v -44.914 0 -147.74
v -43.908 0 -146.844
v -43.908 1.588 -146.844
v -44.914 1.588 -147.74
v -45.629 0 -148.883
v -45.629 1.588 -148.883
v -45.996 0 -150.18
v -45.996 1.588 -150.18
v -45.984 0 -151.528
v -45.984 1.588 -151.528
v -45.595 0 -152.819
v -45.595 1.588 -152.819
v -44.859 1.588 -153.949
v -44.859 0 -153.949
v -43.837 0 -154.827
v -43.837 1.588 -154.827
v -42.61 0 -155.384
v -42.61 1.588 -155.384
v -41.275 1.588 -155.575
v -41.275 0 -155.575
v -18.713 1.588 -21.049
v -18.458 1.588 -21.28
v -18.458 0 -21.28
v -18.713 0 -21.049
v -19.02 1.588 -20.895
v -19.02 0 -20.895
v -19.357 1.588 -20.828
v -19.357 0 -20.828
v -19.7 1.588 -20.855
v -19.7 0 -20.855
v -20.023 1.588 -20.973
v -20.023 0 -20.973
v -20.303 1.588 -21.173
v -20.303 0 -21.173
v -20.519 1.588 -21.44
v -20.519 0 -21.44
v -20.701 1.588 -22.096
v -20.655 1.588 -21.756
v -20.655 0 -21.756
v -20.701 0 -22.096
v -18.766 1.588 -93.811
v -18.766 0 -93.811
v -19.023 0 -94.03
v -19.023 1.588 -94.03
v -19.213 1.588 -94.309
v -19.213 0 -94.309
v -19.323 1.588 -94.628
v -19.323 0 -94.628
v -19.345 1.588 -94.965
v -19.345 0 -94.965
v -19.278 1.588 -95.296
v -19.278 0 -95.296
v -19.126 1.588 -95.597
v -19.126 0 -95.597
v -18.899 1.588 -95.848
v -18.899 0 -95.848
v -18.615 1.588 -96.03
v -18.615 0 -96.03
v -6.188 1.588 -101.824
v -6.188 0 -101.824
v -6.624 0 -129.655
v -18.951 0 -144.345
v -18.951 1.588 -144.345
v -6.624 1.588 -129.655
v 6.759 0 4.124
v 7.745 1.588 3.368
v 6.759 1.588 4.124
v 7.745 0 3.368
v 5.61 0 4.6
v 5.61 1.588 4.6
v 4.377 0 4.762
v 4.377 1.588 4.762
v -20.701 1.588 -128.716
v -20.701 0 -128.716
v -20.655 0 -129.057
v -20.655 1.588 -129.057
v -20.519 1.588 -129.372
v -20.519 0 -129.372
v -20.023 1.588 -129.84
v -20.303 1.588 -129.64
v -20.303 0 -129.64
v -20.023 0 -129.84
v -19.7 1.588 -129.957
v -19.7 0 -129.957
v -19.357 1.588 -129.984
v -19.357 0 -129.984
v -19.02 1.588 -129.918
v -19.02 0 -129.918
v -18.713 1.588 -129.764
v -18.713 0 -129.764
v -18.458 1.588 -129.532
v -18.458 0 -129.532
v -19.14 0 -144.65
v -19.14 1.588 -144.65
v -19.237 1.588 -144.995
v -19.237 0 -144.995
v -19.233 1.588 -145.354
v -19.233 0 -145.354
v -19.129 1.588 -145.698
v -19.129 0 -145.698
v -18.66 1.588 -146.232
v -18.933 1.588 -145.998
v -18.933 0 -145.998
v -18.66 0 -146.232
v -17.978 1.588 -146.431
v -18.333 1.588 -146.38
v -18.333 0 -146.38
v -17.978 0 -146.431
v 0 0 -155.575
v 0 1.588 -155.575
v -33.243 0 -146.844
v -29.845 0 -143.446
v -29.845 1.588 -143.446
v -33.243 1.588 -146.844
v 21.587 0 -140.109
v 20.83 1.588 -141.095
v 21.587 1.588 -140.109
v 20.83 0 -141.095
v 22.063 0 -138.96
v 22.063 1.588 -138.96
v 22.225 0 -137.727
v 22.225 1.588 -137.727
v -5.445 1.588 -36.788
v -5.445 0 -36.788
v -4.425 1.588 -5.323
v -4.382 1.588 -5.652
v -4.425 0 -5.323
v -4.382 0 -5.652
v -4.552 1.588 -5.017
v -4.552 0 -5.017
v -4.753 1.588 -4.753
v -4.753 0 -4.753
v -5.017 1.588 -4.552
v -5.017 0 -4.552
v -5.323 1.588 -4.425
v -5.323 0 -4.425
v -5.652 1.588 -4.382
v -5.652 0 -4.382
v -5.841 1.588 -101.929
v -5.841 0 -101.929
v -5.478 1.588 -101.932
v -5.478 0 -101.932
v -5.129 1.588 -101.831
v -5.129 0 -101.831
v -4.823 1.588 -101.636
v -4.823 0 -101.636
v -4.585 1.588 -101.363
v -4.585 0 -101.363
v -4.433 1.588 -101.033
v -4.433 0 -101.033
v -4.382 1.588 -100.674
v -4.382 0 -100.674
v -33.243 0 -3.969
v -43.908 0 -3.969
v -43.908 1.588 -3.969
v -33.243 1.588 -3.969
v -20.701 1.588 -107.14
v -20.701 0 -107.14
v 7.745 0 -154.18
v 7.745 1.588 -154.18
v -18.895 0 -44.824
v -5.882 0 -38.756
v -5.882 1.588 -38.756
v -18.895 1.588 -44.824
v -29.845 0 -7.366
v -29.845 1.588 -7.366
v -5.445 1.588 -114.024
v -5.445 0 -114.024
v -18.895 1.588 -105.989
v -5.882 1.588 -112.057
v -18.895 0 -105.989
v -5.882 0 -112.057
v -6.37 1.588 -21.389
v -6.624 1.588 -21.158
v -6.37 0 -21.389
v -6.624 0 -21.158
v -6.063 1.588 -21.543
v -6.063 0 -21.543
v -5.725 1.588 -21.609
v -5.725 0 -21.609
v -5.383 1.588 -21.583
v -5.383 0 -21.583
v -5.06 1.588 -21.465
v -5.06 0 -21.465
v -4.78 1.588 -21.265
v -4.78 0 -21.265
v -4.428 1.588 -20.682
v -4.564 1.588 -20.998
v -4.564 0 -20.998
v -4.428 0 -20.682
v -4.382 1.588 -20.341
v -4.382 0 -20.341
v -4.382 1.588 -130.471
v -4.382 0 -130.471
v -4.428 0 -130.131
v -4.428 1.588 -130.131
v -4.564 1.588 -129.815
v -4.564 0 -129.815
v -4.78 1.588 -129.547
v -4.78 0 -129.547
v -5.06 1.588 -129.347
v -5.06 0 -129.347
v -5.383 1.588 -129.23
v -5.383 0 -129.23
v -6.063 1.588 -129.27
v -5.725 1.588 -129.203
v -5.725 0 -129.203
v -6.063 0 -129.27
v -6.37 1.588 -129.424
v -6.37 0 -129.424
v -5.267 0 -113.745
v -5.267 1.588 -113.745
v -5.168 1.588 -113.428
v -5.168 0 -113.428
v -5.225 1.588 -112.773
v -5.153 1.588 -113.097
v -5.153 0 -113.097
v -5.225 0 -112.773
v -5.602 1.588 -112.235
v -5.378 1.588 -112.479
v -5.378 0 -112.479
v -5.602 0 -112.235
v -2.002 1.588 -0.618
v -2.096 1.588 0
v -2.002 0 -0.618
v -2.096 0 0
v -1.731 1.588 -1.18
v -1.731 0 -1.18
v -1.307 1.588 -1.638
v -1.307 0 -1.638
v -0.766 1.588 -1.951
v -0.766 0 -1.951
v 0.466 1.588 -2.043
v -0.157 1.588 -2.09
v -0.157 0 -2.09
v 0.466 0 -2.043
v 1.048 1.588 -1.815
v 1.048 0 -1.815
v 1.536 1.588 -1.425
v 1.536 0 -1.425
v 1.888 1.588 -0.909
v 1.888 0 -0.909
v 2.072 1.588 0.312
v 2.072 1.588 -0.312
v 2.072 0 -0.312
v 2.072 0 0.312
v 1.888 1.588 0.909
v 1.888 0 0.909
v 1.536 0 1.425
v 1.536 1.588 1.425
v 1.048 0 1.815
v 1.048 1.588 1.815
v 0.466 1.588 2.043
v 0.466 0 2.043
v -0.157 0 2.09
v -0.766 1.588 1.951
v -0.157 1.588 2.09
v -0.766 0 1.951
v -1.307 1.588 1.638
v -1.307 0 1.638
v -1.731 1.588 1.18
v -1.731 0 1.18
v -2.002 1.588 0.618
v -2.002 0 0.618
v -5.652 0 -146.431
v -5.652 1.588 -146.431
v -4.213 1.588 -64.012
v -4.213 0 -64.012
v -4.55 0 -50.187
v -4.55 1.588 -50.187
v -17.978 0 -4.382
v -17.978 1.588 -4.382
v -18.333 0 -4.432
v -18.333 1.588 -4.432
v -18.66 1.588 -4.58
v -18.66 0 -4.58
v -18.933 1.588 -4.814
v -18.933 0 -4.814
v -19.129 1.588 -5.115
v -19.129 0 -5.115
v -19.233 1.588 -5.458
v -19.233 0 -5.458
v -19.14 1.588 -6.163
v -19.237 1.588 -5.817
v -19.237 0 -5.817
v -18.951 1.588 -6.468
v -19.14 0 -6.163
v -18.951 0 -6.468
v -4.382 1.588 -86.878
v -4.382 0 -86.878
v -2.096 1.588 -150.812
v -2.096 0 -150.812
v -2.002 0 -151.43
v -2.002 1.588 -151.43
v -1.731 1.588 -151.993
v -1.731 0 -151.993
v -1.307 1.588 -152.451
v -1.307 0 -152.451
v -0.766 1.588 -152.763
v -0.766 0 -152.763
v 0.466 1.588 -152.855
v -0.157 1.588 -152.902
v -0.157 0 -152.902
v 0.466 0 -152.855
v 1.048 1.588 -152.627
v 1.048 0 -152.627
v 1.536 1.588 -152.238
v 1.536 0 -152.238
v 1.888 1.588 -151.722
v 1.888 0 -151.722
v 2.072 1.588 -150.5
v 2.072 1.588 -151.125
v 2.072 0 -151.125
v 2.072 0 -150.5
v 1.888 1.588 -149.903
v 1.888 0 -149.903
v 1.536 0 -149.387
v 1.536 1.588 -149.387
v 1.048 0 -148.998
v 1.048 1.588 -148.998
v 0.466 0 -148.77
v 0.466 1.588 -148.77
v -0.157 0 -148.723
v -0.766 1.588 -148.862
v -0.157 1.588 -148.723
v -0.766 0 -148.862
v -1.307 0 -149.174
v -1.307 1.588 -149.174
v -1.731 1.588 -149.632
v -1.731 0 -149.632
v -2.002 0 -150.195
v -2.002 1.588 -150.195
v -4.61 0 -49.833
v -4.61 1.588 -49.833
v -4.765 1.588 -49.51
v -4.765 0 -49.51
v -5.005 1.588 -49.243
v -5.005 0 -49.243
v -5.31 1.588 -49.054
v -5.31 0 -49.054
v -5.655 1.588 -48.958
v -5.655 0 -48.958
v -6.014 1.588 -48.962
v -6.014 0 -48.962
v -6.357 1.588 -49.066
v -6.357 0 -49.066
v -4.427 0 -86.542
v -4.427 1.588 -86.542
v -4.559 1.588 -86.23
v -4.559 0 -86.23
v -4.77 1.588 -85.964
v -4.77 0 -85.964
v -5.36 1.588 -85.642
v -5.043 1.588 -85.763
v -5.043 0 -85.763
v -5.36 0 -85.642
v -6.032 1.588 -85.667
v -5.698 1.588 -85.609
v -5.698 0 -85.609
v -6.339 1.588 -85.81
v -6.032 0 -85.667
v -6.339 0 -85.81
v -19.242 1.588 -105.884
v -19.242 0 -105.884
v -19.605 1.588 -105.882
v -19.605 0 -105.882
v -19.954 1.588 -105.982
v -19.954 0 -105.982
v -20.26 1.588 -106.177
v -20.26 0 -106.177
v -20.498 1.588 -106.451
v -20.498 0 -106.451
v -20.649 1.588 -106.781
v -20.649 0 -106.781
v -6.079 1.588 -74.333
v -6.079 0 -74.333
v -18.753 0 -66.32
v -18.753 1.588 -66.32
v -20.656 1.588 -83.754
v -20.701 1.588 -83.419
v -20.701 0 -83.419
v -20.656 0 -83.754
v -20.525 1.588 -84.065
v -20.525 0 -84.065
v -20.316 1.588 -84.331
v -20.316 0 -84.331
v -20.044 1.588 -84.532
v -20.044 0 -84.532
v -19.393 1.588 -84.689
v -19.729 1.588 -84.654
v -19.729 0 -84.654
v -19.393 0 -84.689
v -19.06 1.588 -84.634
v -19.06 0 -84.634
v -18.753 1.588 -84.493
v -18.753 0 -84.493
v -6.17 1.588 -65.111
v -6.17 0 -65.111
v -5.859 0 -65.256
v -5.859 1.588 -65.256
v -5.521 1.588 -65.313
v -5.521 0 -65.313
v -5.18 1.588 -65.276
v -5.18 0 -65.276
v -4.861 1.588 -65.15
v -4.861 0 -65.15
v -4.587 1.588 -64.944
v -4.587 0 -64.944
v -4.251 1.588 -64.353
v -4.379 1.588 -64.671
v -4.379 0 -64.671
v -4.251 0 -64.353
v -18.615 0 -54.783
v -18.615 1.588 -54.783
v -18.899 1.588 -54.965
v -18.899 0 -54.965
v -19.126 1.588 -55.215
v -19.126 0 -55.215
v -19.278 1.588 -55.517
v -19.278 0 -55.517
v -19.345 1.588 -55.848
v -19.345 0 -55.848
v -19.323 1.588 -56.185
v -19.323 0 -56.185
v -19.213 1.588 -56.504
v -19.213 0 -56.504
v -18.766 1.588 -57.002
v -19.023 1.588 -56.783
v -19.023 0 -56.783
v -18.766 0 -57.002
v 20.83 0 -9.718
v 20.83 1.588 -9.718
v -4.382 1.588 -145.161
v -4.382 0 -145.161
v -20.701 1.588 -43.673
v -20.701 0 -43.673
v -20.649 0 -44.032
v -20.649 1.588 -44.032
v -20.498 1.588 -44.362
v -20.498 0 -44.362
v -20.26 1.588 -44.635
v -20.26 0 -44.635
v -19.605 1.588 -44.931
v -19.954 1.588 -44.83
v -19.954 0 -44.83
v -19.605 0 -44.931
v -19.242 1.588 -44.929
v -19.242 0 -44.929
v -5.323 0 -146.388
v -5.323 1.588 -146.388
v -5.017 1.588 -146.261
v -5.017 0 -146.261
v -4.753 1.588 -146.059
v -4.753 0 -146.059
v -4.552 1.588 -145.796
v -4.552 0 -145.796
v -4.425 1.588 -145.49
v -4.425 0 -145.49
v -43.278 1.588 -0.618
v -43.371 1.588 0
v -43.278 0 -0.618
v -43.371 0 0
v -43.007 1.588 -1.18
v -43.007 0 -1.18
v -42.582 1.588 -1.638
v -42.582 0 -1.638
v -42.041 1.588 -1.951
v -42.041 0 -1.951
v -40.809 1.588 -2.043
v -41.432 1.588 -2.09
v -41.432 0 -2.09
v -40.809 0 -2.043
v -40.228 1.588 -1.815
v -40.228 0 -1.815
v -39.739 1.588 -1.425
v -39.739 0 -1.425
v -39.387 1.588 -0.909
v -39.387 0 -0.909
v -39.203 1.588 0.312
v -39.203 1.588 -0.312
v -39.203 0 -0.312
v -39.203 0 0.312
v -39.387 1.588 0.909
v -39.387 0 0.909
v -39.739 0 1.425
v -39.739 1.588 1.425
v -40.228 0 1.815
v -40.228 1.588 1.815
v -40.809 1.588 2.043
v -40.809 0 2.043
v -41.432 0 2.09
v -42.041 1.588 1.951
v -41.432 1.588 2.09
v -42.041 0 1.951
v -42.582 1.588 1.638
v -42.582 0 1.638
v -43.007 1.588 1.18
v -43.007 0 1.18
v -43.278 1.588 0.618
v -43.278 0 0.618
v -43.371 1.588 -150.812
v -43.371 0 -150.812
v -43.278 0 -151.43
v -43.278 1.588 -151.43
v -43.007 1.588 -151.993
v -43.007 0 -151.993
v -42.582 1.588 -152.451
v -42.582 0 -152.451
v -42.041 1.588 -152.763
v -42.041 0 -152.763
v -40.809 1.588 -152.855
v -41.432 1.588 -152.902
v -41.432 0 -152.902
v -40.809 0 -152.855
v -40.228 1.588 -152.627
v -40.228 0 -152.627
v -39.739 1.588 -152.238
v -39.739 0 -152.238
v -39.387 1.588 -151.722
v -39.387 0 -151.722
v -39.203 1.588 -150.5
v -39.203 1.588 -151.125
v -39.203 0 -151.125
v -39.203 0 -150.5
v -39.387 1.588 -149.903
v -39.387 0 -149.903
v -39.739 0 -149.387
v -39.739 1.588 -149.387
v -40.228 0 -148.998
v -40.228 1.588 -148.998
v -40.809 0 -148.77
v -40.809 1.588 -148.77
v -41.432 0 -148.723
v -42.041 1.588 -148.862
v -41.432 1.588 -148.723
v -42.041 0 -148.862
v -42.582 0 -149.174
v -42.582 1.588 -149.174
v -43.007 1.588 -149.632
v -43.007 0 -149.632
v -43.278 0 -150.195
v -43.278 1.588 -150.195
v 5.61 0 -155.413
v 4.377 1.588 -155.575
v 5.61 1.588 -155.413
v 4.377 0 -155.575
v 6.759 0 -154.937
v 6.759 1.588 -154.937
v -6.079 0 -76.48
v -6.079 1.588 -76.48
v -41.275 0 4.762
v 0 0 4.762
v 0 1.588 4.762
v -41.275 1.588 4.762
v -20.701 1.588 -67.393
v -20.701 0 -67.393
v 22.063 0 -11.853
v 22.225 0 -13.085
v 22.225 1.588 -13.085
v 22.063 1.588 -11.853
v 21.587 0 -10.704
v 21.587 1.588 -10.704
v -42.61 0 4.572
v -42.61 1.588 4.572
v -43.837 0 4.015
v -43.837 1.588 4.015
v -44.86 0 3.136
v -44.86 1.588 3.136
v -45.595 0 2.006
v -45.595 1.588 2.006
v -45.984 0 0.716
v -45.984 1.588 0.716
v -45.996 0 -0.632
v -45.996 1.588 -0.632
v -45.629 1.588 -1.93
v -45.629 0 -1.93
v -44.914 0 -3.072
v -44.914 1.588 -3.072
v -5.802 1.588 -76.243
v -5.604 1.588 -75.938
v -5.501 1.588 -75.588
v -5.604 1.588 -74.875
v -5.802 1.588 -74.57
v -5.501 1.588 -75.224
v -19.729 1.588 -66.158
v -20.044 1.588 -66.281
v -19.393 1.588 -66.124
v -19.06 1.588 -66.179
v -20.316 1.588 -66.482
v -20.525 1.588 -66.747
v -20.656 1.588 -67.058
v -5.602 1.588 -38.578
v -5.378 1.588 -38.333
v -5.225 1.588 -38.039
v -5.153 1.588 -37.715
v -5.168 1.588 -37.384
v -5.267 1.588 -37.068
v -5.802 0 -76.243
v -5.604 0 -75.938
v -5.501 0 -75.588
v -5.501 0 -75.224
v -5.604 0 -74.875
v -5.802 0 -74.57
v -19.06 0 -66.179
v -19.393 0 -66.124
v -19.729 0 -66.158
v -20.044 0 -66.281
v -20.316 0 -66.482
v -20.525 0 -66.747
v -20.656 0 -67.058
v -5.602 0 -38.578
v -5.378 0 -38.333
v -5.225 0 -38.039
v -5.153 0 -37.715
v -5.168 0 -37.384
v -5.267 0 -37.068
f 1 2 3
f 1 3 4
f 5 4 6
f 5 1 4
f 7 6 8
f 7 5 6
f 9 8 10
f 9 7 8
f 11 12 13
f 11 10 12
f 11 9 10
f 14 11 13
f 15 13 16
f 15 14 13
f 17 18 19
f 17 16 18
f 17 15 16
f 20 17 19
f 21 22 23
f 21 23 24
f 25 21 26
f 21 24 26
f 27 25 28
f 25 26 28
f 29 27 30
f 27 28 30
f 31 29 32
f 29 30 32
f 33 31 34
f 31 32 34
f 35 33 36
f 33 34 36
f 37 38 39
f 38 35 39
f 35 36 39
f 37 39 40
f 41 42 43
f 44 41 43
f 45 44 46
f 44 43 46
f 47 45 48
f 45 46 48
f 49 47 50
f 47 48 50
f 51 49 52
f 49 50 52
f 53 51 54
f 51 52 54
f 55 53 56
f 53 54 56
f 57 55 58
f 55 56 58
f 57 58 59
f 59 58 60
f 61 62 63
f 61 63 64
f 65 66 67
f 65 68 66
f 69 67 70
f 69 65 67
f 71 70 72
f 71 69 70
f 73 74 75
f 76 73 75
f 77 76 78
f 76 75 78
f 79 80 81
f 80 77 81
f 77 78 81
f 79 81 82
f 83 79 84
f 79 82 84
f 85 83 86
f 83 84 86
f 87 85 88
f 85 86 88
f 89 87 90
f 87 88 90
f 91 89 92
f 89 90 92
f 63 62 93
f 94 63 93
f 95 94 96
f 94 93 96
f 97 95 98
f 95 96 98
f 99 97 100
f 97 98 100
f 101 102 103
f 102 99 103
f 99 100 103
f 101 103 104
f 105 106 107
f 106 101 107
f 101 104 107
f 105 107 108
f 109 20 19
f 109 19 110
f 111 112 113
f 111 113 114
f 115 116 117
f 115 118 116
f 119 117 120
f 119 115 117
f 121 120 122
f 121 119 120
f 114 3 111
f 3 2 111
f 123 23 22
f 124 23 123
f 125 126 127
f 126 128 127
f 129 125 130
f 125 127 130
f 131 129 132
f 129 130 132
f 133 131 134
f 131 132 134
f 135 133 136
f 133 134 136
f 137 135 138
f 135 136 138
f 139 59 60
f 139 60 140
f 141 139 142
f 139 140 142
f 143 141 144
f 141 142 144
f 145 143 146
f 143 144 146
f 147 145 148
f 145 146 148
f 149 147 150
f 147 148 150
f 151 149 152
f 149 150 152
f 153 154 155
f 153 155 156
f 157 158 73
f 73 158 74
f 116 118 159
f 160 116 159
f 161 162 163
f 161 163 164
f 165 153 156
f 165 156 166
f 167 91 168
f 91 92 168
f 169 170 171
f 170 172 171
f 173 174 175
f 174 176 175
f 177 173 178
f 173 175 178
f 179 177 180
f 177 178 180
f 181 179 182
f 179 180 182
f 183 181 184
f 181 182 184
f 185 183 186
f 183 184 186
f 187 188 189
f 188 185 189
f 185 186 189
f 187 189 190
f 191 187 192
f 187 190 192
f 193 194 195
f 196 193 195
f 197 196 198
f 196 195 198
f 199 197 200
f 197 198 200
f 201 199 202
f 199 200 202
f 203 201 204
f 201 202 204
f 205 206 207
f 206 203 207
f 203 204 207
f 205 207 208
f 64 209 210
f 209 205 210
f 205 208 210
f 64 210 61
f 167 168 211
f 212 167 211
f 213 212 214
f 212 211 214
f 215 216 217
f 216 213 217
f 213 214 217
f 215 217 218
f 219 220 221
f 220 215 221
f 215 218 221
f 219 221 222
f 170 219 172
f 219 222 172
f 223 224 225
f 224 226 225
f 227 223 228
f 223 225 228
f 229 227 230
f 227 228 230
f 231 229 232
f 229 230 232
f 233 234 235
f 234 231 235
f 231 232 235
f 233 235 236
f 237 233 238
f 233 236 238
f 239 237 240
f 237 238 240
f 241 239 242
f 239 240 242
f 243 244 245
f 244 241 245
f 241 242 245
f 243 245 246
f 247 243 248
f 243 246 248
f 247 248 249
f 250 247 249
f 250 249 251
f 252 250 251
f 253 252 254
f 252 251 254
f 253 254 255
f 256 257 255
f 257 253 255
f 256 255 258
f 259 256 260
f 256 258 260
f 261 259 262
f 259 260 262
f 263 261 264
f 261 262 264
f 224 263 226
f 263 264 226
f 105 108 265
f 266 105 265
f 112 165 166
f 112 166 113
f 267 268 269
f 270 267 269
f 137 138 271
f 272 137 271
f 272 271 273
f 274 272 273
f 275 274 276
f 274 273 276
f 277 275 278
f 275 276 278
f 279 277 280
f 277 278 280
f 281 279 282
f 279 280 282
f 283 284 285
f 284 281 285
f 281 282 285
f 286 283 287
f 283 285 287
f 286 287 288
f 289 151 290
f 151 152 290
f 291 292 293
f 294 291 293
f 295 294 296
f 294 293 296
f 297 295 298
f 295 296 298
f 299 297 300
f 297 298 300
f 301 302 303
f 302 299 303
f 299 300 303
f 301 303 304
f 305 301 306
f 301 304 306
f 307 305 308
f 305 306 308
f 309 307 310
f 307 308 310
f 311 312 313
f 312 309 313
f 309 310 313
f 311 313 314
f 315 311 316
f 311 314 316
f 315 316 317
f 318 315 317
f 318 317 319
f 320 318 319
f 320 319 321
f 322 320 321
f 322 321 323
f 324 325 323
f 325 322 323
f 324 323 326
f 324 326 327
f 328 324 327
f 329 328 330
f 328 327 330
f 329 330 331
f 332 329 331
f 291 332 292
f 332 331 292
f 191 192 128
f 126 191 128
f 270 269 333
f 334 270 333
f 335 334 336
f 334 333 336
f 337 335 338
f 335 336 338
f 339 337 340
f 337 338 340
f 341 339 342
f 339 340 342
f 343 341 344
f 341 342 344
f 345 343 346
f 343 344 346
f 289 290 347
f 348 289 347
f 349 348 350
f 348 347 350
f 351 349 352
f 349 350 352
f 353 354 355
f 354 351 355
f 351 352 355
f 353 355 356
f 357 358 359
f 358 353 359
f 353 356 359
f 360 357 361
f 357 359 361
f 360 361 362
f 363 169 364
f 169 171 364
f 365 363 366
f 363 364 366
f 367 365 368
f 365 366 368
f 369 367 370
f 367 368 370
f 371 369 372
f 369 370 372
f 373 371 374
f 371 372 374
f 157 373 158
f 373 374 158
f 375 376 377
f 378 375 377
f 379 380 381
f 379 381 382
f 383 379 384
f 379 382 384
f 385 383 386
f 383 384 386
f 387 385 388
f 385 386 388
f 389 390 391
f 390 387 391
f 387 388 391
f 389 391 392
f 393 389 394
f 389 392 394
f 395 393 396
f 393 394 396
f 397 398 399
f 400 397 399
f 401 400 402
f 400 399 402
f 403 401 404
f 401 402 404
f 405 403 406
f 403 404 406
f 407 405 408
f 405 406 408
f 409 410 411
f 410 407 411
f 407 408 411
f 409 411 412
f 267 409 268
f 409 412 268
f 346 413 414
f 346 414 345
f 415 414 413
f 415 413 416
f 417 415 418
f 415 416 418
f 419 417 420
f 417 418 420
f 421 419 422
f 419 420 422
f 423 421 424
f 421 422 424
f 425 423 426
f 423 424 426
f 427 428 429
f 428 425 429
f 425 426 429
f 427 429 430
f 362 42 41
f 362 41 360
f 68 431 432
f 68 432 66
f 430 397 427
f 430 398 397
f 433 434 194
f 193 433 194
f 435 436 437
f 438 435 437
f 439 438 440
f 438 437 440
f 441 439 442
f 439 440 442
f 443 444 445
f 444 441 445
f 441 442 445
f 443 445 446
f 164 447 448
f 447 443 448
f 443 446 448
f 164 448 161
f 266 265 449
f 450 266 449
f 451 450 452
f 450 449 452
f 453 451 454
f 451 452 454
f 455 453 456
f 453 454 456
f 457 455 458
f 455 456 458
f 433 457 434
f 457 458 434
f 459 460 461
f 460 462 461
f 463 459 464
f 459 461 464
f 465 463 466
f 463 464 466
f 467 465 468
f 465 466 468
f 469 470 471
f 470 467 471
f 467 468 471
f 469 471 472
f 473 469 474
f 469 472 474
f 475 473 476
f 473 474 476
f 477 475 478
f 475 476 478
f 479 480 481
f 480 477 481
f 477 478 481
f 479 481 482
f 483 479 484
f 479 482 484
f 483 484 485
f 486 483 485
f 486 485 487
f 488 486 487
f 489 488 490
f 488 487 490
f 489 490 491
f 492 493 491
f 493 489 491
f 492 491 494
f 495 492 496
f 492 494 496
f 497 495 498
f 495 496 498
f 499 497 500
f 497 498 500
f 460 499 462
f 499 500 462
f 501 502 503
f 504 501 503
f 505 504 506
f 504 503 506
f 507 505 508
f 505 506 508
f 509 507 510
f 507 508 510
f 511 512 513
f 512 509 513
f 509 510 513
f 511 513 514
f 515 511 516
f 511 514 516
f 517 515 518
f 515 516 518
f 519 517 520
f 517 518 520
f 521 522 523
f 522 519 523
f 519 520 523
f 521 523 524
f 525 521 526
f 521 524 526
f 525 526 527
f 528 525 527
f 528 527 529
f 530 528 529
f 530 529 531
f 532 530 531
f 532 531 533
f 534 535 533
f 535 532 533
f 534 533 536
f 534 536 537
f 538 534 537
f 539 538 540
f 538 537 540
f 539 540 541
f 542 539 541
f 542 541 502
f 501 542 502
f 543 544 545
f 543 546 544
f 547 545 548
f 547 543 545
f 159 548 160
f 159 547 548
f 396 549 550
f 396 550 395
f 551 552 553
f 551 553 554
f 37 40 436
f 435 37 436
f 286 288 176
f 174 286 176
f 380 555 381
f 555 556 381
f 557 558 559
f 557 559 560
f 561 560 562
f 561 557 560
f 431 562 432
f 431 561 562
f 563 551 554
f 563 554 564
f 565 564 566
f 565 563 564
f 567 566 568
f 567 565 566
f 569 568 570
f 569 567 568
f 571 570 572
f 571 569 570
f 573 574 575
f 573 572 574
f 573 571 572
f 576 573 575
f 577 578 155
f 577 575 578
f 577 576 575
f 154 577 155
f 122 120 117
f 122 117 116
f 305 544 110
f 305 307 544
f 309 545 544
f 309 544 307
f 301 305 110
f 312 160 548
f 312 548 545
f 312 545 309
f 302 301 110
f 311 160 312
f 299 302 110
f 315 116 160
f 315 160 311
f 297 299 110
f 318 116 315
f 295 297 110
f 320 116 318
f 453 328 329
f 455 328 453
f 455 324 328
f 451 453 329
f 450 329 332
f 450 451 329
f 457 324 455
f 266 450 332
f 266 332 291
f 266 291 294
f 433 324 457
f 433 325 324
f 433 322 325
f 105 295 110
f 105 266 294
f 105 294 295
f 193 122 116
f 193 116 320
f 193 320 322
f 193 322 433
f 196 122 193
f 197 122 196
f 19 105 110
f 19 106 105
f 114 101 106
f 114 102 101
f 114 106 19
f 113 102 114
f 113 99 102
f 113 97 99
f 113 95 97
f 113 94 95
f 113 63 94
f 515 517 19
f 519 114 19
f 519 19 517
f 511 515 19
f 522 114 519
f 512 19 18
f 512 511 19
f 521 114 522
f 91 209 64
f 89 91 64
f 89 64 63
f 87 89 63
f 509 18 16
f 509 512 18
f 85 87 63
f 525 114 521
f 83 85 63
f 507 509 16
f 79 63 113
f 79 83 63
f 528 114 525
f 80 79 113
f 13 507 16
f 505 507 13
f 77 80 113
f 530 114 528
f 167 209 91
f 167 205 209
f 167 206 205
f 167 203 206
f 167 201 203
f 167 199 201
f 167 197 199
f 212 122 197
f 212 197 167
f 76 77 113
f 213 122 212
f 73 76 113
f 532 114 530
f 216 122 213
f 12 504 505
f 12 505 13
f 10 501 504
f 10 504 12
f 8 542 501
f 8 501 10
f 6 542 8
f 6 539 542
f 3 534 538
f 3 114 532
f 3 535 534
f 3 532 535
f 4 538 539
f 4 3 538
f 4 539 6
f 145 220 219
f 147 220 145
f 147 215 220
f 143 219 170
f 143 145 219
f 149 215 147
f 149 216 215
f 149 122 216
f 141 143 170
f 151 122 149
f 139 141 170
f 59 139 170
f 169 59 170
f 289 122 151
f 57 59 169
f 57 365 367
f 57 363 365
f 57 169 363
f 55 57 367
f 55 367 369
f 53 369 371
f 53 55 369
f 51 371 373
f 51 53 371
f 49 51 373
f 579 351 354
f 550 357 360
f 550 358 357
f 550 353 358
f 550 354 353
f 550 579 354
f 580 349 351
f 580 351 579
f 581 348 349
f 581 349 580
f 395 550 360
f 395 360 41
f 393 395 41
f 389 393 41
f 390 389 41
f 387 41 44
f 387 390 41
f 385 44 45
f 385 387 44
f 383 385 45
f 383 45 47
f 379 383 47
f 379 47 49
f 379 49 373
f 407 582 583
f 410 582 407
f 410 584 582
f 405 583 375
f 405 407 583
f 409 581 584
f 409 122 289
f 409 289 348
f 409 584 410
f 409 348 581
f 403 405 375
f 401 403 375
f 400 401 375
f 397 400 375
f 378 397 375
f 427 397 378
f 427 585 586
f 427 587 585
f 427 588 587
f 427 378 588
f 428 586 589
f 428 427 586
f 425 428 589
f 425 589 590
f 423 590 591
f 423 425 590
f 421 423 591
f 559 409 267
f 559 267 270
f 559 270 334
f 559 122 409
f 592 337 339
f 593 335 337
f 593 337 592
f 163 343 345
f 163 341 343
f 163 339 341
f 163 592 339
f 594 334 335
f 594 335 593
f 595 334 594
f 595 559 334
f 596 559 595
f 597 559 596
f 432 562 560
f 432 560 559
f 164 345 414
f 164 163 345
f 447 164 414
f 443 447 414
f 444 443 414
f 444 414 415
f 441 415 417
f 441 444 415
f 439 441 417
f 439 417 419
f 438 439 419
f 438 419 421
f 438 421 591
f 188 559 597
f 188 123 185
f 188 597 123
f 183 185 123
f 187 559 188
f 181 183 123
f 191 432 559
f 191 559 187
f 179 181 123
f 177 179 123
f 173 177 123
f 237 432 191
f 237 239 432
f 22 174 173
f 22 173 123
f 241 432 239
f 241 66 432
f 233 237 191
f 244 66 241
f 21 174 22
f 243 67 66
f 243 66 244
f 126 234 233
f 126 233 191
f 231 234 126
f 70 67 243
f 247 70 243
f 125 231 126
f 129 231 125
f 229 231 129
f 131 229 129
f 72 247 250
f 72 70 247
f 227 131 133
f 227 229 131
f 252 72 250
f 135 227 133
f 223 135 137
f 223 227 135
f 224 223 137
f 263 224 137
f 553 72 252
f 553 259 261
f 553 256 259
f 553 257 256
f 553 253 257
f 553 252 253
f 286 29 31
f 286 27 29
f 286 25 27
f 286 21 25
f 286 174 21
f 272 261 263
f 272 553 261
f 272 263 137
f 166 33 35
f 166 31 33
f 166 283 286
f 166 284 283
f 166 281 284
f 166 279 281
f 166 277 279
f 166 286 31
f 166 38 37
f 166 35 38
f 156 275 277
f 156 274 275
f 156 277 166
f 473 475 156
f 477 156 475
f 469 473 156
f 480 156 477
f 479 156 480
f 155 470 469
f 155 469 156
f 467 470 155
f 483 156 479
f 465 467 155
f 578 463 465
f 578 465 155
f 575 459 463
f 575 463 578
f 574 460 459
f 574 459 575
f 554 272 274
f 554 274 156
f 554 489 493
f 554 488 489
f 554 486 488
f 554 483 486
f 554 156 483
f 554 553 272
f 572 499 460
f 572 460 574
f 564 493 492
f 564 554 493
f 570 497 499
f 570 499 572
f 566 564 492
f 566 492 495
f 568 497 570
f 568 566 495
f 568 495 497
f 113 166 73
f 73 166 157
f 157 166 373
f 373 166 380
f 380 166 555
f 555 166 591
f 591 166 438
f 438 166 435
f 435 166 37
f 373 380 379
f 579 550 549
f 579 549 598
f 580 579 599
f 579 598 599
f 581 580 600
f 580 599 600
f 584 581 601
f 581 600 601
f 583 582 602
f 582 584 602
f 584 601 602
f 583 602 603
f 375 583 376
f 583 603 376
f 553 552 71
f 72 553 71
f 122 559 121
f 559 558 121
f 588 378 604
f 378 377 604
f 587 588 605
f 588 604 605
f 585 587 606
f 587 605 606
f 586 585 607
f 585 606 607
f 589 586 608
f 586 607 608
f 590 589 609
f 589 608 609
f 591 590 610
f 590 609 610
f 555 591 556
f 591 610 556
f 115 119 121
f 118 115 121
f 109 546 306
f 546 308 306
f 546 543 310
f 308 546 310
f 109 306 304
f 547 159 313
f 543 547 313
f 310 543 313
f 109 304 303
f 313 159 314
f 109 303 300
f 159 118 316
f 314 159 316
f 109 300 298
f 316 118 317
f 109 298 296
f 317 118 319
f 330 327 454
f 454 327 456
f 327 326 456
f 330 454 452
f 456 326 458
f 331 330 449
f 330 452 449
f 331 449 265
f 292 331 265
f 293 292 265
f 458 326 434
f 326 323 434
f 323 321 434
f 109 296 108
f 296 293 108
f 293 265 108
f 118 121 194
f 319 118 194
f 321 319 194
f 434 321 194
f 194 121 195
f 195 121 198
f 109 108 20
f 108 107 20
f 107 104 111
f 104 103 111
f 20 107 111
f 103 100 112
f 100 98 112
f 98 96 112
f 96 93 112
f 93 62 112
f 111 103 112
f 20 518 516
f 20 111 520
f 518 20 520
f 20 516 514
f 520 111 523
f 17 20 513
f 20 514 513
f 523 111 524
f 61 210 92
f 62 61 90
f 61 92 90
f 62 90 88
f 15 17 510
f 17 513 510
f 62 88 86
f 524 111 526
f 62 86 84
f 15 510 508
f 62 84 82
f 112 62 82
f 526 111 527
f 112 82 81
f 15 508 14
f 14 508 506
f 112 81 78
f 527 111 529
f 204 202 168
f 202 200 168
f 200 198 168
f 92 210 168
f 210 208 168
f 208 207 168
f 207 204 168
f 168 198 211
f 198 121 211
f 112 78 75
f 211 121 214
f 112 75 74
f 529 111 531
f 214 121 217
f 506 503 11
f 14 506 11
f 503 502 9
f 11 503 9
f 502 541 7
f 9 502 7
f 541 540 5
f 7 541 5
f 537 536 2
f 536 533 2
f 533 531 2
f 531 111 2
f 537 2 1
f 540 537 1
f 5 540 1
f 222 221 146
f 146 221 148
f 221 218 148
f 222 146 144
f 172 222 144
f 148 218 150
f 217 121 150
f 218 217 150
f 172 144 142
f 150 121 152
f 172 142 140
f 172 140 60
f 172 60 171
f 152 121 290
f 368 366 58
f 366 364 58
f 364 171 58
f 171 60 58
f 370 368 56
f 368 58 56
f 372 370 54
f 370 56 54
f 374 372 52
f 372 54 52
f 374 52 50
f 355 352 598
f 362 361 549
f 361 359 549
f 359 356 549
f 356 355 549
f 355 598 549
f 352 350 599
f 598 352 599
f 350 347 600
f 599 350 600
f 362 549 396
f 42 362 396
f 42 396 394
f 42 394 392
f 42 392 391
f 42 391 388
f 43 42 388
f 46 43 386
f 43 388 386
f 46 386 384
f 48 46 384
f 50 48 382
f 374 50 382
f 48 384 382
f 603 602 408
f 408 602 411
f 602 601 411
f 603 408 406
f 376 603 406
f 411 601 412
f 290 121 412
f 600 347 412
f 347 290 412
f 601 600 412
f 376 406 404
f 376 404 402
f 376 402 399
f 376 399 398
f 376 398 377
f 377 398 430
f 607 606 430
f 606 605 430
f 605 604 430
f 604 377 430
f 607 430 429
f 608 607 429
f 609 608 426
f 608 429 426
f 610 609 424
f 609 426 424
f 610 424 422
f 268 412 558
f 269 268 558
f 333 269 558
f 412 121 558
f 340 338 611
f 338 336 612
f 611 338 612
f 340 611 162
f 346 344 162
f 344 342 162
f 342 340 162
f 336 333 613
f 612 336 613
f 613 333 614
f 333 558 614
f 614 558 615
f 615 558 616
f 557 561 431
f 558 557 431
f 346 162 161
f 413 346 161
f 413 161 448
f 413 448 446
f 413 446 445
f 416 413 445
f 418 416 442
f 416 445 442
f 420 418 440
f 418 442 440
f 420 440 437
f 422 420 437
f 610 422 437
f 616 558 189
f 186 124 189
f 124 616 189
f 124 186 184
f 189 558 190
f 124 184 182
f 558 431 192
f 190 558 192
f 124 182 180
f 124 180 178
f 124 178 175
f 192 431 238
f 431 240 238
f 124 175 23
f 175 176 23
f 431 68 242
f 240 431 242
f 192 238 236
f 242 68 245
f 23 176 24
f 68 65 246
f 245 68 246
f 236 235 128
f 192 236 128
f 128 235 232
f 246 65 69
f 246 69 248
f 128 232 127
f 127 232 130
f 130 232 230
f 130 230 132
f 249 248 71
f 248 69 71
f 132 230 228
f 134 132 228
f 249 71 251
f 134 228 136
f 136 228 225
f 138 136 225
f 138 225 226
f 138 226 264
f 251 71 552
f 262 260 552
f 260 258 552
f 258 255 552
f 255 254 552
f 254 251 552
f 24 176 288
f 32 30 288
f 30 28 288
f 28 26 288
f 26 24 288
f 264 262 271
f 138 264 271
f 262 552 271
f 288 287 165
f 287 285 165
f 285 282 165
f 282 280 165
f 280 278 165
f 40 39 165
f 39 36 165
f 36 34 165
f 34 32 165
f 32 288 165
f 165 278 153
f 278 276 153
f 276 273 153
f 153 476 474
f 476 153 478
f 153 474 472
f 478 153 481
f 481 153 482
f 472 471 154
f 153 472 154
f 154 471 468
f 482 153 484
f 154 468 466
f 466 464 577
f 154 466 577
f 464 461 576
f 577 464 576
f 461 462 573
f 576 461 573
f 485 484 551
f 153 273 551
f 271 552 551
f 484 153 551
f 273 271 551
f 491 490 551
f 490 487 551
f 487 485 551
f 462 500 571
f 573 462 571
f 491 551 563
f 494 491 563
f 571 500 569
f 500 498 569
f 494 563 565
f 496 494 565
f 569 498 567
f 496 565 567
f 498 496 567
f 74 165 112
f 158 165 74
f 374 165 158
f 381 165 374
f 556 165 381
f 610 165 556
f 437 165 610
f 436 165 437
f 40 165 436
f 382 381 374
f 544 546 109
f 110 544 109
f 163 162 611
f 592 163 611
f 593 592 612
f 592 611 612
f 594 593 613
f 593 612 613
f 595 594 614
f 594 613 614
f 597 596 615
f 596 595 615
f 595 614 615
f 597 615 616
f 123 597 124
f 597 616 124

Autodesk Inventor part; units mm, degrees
ref_plane "YZ Plane" through (0, 0, 0) normal (1, 0, 0) x (0, 1, 0)
ref_plane "XZ Plane" through (0, 0, 0) normal (0, 1, 0) x (-1, 0, 0)
ref_plane "XY Plane" through (0, 0, 0) normal (0, 0, 1) x (1, 0, 0)
sketch "Sketch1" plane through (0, 0, 0) normal (0, 1, 0) x (-1, 0, 0)
  circle A0 centre (0, 0) radius 2.0955
  circle A1 centre (41.2753, 0) radius 2.0955
  circle A2 centre (0, -150.8125) radius 2.0955
  circle A3 centre (41.2753, -150.8125) radius 2.0955
  arc A4 (43.9079, -3.9688) -> (41.2753, 4.7625) centre (41.2753, 0) ccw
  arc A5 (41.2753, -155.575) -> (43.9079, -146.8438) centre (41.2753, -150.8125) ccw
  line L0 (29.8453, -7.366) -> (29.8453, -143.4465)
  line L1 (41.2753, -155.575) -> (0, -155.575)
  line L2 (0, 4.7625) -> (41.2753, 4.7625)
  line L3 (33.2426, -3.9688) -> (29.8453, -7.366)
  line L4 (29.8453, -143.4465) -> (33.2426, -146.8438)
  line L5 (17.9778, -146.431) -> (5.6515, -146.431)
  line L6 (5.6515, -4.3815) -> (17.9778, -4.3815)
  line L7 (18.9507, -6.4678) -> (6.6244, -21.1577)
  line L8 (20.7013, -4.3815) -> (39.8776, -4.3815) construction
  line L9 (18.4584, -21.28) -> (5.4454, -36.7883)
  line L10 (5.8815, -38.7557) -> (18.8946, -44.8238)
  line L11 (4.3815, -38.0562) -> (18.7398, -38.0562) construction
  line L12 (18.6151, -54.7828) -> (6.3567, -49.0665)
  line L13 (6.1698, -65.111) -> (18.7659, -57.0016)
  line L14 (18.9507, -144.3447) -> (6.6244, -129.6548)
  line L15 (20.7013, -146.431) -> (39.8776, -146.431) construction
  line L16 (18.4584, -129.5325) -> (5.4454, -114.0242)
  line L17 (5.8815, -112.0568) -> (18.8946, -105.9887)
  line L18 (4.3815, -112.7563) -> (18.7398, -112.7563) construction
  line L19 (18.6151, -96.0297) -> (6.1882, -101.8245)
  line L20 (18.7659, -93.8109) -> (6.339, -85.8105)
  line L21 (20.7013, -95.0569) -> (35.4808, -95.0569) construction
  line L22 (6.0792, -76.4797) -> (18.7526, -84.4929)
  line L23 (6.0792, -74.3328) -> (18.7526, -66.3196)
  line L24 (4.3815, -20.3414) -> (4.3815, -5.6515)
  line L25 (20.7013, -22.0963) -> (20.7013, -43.6728)
  line L26 (4.2127, -64.0121) -> (4.5503, -50.1866)
  line L27 (20.7013, -67.3931) -> (20.7013, -83.4194)
  line L28 (20.7013, -107.1397) -> (20.7013, -128.7162)
  line L29 (4.3815, -145.161) -> (4.3815, -130.4711)
  line L30 (4.3815, -100.6735) -> (4.3815, -86.8783)
  arc A6 (4.3815, -20.3414) -> (6.6244, -21.1577) centre (5.6515, -20.3414) ccw
  arc A7 (5.6515, -4.3815) -> (4.3815, -5.6515) centre (5.6515, -5.6515) ccw
  arc A8 (18.9507, -6.4678) -> (17.9778, -4.3815) centre (17.9778, -5.6515) ccw
  arc A9 (20.7013, -22.0963) -> (18.4584, -21.28) centre (19.4313, -22.0963) ccw
  arc A10 (5.4454, -36.7883) -> (5.8815, -38.7557) centre (6.4183, -37.6047) ccw
  arc A11 (18.8946, -44.8238) -> (20.7013, -43.6728) centre (19.4313, -43.6728) ccw
  arc A12 (6.3567, -49.0665) -> (4.5503, -50.1866) centre (5.8199, -50.2176) ccw
  arc A13 (4.2127, -64.0121) -> (6.1698, -65.111) centre (5.4823, -64.0431) ccw
  arc A14 (18.7659, -57.0016) -> (18.6151, -54.7828) centre (18.0784, -55.9338) ccw
  arc A15 (6.0792, -74.3328) -> (6.0792, -76.4797) centre (6.7579, -75.4063) ccw
  arc A16 (18.7526, -84.4929) -> (20.7013, -83.4194) centre (19.4313, -83.4194) ccw
  arc A17 (20.7013, -67.3931) -> (18.7526, -66.3196) centre (19.4313, -67.3931) ccw
  arc A18 (6.339, -85.8105) -> (4.3815, -86.8783) centre (5.6515, -86.8783) ccw
  arc A19 (18.6151, -96.0297) -> (18.7659, -93.8109) centre (18.0784, -94.8787) ccw
  arc A20 (4.3815, -100.6735) -> (6.1882, -101.8245) centre (5.6515, -100.6735) ccw
  arc A21 (20.7013, -107.1397) -> (18.8946, -105.9887) centre (19.4313, -107.1397) ccw
  arc A22 (5.8815, -112.0568) -> (5.4454, -114.0242) centre (6.4183, -113.2078) ccw
  arc A23 (18.4584, -129.5325) -> (20.7013, -128.7162) centre (19.4313, -128.7162) ccw
  arc A24 (6.6244, -129.6548) -> (4.3815, -130.4711) centre (5.6515, -130.4711) ccw
  arc A25 (4.3815, -145.161) -> (5.6515, -146.431) centre (5.6515, -145.161) ccw
  arc A26 (17.9778, -146.431) -> (18.9507, -144.3447) centre (17.9778, -145.161) ccw
  line L31 (0, 4.7625) -> (-4.3773, 4.7625)
  line L32 (-22.225, -13.0852) -> (-22.225, -137.7273)
  line L33 (-4.3773, -155.575) -> (0, -155.575)
  line L34 (43.9079, -3.9688) -> (33.2426, -3.9688)
  line L35 (43.9079, -146.8438) -> (33.2426, -146.8438)
  line L36 (-20.8301, -9.7176) -> (-7.7449, 3.3676)
  line L37 (-20.8301, -141.0949) -> (-7.7449, -154.1801)
  arc A27 (-4.3773, 4.7625) -> (-7.7449, 3.3676) centre (-4.3773, 0) ccw
  arc A28 (-20.8301, -9.7176) -> (-22.225, -13.0852) centre (-17.4625, -13.0852) ccw
  arc A29 (-22.225, -137.7273) -> (-20.8301, -141.0949) centre (-17.4625, -137.7273) ccw
  arc A30 (-7.7449, -154.1801) -> (-4.3773, -155.575) centre (-4.3773, -150.8125) ccw
  point P0 (29.8453, -4.7625)
  point P1 (29.8453, -146.05)
  point P2 (32.8298, -4.3815)
  point P3 (32.4488, -146.05)
  point P4 (-17.4625, 4.7625)
  point P5 (-22.225, 0)
  point P6 (-17.4625, -155.575)
  point P7 (-22.225, -150.8125)
  point P8 (-22.225, 4.7625)
  point P9 (-22.225, -11.1125)
  point P10 (-6.35, 4.7625)
  point P11 (-22.225, 4.7625)
  point P12 (-22.225, -139.7)
  point P13 (-6.35, -155.575)
  point P14 (-22.225, -155.575)
  point P15 (4.3815, -57.0993)
  dimension "d0" = 4.191
  dimension "d3" = 9.525
  dimension "d20" = 1.27
  dimension "d24" = 22.225
  dimension "d27" = 15.875
  dimension "d28" = 15.875
  dimension "d29" = 15.875
  dimension "d30" = 15.875
  dimension "d31" = 4.7625
extrude "Extrusion1" add sketch "Sketch1" along normal blind 1.5875
equation "\"d28\" = d27"
equation "\"d29\" = d27"
equation "\"d30\" = d29"
equation "\"BendRadius\" = Thickness"
equation "\"BendReliefWidth\" = Thickness"
equation "\"BendReliefDepth\" = 0.5 * Thickness"
equation "\"CornerReliefSize\" = 4 * Thickness"
equation "\"MinimumRemnant\" = 2 * Thickness"
equation "\"TransitionRadius\" = BendRadius"
equation "\"JacobiRadiusSize\" = BendRadius"
equation "\"GapSize\" = Thickness"
equation "\"Thickness\" = 1.5875"
properties part number "ramp" material "Acetal Resin, White"
